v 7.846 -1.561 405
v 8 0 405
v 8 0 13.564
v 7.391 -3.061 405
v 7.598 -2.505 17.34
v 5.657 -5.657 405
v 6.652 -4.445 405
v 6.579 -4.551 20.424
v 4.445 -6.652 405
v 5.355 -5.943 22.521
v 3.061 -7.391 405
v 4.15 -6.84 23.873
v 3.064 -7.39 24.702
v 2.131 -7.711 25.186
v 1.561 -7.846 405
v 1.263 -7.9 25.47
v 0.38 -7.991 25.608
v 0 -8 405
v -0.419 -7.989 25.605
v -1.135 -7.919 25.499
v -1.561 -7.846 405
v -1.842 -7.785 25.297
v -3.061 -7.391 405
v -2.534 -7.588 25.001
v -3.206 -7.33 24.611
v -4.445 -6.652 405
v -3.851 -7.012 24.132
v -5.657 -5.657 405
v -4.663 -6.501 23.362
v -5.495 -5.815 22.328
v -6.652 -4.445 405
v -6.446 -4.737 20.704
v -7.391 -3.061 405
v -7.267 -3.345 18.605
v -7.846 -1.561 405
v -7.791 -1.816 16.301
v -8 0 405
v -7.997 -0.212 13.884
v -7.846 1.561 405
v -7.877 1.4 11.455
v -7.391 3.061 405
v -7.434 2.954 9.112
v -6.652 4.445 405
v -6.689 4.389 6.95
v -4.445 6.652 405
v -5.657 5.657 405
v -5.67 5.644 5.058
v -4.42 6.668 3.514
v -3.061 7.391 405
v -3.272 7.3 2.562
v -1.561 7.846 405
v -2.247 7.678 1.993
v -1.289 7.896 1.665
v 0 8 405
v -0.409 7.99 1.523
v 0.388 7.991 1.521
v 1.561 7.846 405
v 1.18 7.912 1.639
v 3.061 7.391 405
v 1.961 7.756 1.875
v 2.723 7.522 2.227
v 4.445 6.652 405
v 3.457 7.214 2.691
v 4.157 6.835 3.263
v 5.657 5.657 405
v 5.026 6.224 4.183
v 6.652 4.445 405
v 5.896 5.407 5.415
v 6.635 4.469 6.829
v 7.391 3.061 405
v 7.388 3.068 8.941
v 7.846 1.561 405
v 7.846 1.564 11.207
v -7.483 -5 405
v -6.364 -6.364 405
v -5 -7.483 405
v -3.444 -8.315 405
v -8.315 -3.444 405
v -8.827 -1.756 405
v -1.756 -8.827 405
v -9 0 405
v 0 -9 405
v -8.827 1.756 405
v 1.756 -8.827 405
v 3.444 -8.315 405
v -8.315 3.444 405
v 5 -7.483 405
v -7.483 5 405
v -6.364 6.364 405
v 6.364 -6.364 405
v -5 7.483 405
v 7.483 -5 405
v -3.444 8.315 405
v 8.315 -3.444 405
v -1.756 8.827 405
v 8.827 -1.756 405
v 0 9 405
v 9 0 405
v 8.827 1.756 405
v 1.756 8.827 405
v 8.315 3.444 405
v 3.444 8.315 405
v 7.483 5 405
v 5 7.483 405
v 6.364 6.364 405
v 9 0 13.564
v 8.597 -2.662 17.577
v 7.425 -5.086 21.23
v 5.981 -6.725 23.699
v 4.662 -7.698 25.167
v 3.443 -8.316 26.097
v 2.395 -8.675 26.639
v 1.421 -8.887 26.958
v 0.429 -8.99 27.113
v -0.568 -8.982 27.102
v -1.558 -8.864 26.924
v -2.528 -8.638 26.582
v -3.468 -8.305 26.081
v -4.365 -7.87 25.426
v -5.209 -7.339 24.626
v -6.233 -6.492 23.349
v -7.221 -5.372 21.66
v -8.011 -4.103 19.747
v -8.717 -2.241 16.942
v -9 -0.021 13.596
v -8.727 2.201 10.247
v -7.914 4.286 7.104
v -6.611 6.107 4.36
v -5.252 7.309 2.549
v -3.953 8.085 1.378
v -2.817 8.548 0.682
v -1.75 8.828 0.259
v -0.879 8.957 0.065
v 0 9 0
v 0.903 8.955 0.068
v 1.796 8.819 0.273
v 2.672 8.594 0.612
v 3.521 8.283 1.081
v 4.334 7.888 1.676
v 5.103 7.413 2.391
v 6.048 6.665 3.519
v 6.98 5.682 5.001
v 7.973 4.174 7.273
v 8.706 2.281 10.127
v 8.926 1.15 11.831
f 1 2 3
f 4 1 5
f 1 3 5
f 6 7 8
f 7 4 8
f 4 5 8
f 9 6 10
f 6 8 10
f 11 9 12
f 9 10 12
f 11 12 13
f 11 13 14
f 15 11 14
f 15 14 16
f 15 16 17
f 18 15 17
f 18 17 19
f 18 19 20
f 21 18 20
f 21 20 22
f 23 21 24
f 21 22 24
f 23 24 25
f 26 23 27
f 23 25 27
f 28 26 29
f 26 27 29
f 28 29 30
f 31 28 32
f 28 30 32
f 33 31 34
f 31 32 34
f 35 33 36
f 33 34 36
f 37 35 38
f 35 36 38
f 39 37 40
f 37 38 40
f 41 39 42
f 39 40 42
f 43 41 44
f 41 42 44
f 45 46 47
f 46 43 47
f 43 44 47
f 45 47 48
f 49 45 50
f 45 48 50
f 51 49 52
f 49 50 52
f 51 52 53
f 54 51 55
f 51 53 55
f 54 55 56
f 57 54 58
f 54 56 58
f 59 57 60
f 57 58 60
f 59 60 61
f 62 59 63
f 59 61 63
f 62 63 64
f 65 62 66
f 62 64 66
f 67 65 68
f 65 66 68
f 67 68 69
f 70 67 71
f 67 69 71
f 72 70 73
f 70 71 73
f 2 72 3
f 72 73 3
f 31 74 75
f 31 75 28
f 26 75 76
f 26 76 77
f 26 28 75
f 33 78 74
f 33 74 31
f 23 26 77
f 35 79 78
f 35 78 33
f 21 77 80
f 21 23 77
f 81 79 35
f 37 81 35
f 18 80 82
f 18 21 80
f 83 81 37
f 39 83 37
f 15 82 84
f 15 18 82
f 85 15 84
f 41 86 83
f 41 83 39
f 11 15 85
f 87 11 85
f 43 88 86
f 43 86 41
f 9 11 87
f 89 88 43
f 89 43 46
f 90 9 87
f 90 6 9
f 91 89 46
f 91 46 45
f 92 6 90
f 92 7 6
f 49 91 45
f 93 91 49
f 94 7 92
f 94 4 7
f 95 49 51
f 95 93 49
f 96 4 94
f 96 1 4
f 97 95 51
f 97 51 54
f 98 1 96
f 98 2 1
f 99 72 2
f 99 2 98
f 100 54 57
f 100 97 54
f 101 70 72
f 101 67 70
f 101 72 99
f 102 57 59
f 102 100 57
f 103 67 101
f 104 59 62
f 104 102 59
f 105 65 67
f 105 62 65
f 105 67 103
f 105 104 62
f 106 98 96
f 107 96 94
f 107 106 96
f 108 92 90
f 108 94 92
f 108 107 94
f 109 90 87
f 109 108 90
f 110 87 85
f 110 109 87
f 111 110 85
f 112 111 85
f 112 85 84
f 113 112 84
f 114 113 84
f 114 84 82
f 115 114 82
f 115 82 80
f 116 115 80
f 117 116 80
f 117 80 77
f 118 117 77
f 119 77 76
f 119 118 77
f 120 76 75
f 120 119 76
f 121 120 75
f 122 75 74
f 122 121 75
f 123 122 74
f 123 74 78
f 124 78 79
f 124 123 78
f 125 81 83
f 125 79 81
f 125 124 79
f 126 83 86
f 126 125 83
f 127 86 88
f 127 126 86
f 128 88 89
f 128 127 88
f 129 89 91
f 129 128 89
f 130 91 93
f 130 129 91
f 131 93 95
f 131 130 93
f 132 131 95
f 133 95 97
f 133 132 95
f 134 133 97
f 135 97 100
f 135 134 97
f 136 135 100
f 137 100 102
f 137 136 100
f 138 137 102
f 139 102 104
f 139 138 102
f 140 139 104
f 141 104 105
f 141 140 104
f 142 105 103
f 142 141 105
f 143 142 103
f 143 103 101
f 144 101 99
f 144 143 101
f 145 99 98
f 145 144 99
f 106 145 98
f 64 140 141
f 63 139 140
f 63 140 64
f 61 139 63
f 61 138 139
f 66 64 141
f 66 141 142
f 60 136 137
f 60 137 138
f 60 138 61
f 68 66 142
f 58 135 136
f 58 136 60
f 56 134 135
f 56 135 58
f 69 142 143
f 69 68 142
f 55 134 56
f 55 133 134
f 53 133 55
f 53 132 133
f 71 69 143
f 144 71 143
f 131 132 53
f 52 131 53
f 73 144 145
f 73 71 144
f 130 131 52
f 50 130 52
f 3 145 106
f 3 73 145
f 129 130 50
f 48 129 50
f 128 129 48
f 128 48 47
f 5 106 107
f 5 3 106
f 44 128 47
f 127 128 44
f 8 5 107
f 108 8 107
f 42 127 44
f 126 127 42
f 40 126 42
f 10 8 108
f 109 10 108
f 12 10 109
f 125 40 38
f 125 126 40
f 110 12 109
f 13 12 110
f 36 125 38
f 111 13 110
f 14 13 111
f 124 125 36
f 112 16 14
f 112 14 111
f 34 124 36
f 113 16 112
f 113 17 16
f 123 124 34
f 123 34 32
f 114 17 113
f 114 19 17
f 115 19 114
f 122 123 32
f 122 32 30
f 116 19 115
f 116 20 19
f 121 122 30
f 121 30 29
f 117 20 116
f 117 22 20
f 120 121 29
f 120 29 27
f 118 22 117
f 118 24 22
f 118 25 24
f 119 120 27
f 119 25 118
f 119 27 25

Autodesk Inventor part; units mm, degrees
ref_plane "YZ Plane" through (0, 0, 0) normal (1, 0, 0) x (0, 1, 0)
ref_plane "XZ Plane" through (0, 0, 0) normal (0, 1, 0) x (-1, 0, 0)
sketch "Skizze1" plane through (0, 0, 0) normal (0, 0, 1) x (1, 0, 0)
  line L0 (-12.6, 0) -> (12.6, 0) construction
  line L1 (0, -12.6) -> (0, 12.6) construction
  circle A0 centre (0, 0) radius 9
  circle A1 centre (0, 0) radius 8
  line L2 (-9, 9) -> (9, 9)
  dimension "d0" = 18
  dimension "d1" = 16
extrude "Extrusion4" add sketch "Skizze1" along normal blind 400 contours A0 | A1
extrude "Extrusion5" cut sketch "Skizze1" along normal through all contours A1
ref_plane "Arbeitsebene4" through (-9, 9, 0) normal (0, -0.8333, -0.5529) x (1, 0, 0)
split "Trennen5" plane through (-9, 9, 0) removes the side toward (0, -0.8333, -0.5529)
sketch "Skizze5" plane through (0, 0, 400) normal (0, 0, 1) x (1, 0, 0)
  circle A0 centre (0, 0) radius 8
  circle A1 centre (0, 0) radius 9
  dimension "d17" = 16
  dimension "d18" = 18
extrude "Extrusion6" add sketch "Skizze5" along normal blind 5
properties part number "Schräges Rohr CF16"
